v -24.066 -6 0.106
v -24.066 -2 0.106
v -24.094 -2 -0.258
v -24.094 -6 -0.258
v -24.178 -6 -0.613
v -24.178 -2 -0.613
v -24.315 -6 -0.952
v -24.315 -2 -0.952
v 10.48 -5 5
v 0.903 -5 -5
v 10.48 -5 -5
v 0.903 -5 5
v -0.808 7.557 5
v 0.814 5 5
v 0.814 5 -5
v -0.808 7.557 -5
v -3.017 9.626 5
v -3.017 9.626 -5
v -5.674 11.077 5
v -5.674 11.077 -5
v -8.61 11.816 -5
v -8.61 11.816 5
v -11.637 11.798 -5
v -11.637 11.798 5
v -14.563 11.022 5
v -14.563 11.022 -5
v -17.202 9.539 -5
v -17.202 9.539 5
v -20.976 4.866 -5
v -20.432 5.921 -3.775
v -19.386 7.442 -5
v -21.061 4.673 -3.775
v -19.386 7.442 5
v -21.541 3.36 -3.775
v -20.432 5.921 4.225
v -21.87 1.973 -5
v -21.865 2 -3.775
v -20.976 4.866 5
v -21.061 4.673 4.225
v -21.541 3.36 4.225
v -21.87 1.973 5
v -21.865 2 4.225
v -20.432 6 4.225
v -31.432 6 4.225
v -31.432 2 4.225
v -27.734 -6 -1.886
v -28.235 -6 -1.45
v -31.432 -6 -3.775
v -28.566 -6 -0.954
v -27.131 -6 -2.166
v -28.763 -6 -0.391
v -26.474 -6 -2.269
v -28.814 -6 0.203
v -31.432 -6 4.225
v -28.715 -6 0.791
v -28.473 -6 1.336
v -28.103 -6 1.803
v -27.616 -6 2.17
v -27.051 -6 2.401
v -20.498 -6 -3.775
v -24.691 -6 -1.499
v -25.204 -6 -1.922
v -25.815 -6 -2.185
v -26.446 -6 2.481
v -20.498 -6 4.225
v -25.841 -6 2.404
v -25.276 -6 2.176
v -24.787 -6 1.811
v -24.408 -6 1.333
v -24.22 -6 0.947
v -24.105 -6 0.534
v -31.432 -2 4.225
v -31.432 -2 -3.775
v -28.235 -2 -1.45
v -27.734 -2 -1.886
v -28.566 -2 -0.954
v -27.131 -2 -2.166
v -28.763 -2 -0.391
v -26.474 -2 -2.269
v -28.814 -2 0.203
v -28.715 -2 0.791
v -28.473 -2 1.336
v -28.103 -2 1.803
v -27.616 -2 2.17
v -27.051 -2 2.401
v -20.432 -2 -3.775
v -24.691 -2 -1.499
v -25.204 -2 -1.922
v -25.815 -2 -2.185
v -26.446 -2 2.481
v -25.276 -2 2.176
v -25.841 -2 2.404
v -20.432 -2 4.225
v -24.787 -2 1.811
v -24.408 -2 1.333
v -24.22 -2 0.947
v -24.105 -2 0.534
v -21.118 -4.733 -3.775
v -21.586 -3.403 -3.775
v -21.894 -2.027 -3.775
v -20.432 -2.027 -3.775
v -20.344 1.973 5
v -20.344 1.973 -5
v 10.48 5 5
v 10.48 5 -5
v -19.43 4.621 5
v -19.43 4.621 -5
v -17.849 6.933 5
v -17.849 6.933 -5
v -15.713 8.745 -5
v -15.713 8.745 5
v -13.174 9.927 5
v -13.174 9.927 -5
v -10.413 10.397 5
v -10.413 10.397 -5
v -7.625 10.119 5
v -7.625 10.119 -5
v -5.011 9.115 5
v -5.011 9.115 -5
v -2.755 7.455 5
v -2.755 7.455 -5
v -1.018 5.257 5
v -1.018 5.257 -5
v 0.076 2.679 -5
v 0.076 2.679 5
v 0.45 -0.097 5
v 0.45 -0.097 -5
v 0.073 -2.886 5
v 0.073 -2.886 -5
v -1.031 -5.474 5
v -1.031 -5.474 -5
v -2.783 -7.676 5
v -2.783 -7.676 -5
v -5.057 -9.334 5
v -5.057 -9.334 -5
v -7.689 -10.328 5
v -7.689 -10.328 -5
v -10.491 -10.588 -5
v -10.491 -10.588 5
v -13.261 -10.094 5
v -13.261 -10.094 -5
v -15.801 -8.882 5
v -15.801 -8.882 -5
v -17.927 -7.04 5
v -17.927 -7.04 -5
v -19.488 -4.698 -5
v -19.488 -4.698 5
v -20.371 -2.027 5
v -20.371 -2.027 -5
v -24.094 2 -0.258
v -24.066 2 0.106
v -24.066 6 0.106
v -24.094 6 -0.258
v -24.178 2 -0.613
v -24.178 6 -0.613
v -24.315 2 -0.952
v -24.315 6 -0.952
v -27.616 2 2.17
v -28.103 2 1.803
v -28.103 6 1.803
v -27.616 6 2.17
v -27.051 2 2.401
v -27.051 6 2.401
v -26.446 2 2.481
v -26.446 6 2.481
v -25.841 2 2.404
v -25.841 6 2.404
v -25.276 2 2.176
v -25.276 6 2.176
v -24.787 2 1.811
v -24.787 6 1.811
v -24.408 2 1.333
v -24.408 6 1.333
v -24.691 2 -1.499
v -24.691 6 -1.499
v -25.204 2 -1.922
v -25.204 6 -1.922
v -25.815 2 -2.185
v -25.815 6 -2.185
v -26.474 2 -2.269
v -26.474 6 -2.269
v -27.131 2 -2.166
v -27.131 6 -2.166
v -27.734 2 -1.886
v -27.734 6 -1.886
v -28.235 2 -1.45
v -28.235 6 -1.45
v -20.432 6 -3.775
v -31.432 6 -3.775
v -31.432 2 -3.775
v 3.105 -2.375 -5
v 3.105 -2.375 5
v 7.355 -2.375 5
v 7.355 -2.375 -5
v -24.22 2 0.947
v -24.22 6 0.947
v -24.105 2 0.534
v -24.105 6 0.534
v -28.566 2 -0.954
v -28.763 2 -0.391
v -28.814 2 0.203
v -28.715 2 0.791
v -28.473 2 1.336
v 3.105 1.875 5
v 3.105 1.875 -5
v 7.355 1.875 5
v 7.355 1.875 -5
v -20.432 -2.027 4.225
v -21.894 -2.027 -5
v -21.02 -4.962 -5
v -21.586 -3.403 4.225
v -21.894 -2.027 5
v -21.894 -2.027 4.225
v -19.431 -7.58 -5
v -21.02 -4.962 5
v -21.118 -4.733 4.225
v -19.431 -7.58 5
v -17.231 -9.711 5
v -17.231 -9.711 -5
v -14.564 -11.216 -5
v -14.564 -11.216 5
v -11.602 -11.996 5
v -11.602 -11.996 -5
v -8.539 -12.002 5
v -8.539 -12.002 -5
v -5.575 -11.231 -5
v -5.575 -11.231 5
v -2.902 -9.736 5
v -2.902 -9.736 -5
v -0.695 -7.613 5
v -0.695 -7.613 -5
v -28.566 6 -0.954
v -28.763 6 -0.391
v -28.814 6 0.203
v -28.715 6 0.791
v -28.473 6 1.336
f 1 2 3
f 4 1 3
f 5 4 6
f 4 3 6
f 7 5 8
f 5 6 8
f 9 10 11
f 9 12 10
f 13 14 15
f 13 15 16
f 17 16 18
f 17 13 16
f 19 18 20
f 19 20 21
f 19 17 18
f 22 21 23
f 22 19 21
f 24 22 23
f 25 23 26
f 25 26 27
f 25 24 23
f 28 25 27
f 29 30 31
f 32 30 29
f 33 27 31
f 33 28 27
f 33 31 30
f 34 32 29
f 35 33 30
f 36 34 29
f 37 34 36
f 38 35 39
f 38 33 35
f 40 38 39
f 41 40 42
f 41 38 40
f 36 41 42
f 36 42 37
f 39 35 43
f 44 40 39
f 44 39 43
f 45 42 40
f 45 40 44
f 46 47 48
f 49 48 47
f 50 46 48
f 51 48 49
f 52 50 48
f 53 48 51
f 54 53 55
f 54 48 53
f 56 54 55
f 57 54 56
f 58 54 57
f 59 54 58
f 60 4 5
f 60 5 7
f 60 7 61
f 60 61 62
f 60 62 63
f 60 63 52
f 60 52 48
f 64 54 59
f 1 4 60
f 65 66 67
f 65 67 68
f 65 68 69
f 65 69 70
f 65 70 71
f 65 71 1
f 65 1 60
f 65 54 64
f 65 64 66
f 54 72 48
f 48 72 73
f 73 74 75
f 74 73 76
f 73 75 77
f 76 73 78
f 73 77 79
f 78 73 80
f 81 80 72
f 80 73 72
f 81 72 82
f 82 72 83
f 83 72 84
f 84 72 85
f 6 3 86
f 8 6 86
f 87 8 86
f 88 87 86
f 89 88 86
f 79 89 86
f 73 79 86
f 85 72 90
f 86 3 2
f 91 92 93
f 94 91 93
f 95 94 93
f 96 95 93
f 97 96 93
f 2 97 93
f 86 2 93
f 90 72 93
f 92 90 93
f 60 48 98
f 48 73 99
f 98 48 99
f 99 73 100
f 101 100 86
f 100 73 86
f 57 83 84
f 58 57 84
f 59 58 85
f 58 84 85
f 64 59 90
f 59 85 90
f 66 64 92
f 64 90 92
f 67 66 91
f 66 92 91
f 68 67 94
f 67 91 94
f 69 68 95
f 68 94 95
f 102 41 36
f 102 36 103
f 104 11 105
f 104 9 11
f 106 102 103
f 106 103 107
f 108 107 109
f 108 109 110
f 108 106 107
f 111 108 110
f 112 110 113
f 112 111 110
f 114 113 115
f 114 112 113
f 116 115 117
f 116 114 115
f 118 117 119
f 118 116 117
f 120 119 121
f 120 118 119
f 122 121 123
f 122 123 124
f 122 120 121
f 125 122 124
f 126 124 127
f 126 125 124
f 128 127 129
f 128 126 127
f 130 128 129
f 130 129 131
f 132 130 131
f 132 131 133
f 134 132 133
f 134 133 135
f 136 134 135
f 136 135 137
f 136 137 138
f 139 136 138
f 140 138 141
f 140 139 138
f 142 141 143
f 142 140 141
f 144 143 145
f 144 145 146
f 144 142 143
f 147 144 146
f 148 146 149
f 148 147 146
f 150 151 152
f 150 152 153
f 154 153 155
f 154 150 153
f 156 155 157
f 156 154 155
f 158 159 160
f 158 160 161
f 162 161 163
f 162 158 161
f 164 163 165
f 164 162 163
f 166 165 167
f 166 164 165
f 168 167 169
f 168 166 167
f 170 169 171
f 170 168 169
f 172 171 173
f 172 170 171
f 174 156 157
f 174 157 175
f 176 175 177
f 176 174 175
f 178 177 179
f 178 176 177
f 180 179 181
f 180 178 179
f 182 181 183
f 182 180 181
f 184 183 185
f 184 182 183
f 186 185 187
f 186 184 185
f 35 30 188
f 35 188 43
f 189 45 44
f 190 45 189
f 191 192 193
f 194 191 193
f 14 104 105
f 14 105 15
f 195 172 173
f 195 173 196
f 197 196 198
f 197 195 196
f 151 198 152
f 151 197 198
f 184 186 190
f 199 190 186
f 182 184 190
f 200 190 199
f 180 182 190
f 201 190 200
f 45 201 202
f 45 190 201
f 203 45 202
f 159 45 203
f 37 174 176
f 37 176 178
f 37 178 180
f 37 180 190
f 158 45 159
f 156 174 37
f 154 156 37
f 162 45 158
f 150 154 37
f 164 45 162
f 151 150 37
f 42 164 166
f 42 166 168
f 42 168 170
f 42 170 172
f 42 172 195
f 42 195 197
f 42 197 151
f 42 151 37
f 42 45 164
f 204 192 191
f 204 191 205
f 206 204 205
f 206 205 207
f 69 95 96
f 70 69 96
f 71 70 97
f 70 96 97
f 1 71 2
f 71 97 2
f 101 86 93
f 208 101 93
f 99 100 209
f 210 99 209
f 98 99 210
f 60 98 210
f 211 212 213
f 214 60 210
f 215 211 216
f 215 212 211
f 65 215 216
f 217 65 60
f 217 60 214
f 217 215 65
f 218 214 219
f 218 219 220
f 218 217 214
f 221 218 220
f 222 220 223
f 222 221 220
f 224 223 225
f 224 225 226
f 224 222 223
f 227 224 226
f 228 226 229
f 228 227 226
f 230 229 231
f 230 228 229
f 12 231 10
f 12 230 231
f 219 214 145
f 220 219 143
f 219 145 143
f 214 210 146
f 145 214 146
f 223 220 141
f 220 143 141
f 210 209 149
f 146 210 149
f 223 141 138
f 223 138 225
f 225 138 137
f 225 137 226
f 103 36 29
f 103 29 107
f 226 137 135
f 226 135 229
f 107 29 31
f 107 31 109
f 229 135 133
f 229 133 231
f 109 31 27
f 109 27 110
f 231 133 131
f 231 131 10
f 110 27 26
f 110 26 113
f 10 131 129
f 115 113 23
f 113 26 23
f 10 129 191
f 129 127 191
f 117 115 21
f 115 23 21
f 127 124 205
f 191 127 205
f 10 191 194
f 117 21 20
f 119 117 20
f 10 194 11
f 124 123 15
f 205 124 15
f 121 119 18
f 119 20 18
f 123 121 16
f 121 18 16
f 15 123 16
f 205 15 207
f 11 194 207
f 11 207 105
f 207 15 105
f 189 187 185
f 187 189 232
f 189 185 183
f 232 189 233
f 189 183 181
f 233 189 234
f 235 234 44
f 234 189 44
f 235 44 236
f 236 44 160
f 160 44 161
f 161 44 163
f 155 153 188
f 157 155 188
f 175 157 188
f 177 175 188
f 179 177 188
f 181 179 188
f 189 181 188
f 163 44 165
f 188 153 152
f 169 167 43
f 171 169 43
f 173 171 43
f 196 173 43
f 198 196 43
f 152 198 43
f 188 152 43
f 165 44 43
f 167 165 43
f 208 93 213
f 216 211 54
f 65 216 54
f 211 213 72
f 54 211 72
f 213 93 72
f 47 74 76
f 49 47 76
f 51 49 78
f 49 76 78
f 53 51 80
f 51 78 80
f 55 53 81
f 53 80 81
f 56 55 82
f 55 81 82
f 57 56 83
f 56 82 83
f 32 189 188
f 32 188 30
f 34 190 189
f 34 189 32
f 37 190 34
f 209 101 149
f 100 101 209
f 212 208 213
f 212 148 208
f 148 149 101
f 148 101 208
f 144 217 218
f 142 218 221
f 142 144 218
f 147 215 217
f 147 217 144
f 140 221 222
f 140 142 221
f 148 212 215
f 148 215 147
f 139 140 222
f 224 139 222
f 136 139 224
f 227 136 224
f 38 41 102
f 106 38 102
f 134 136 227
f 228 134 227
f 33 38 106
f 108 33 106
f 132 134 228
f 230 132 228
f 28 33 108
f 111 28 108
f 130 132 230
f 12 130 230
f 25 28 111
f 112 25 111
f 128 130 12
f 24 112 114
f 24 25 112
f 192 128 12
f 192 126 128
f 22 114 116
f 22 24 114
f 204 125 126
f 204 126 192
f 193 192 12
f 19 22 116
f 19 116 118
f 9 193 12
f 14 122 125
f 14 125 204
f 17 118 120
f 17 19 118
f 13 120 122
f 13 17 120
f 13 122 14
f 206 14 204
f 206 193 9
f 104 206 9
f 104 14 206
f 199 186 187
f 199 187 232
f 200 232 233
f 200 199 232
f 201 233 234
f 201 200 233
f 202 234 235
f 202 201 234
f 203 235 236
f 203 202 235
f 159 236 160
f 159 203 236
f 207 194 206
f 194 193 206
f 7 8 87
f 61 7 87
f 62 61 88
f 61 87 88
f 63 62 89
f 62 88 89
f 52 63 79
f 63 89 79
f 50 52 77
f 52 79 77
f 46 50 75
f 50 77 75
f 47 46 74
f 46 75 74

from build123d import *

# Parameters (mm, degrees)
F0_W     = 4.25
F0_H     = 4.25
F1_DEPTH = 5
F3_START = 2
F3_DEPTH = 4
F4_START = -2
F4_DEPTH = 4


# Not quite as in the source:
# - a feature names something its author has since deleted; it is built from what else it names


with BuildPart() as f1:
    # F0 (on Top) → F1 (new body, symmetric)
    with BuildSketch(Plane.XY):
        with BuildLine():
            Line((10.48, -5), (10.48, 5))
            Line((10.48, 5), (0.8137170322, 5))
            ThreePointArc((0.8137170322, 5), (1.6624848855, 2.5140482951), (1.95, -0.0970238614))
            ThreePointArc((1.95, -0.0970238614), (1.6852450978, -2.6038191253), (0.9026629175, -5))
            Line((0.9026629175, -5), (10.48, -5))
        make_face()
        with Locations((5.23, -0.25)):
            Rectangle(F0_W, F0_H, mode=Mode.SUBTRACT)
        with BuildLine():
            ThreePointArc((1.95, -0.0970238614), (1.6624848855, 2.5140482951), (0.8137170322, 5))
            Line((0.8137170322, 5), (0.48, 5))
            Line((0.48, 5), (0.48, -5))
            Line((0.48, -5), (0.9026629175, -5))
            ThreePointArc((0.9026629175, -5), (1.6852450978, -2.6038191253), (1.95, -0.0970238614))
        make_face()
        with BuildLine():
            Line((0.48, 5), (0.8137170322, 5))
            ThreePointArc((0.8137170322, 5), (-11.6370433083, 11.7975670747), (-21.8700390085, 1.9734055232))
            Line((-21.8700390085, 1.9734055232), (-20.3438487537, 1.9734055232))
            ThreePointArc((-20.3438487537, 1.9734055232), (-9.0096663788, 10.3513112192), (0.45, -0.0970238614))
            ThreePointArc((0.45, -0.0970238614), (-9.0810805838, -10.5522232935), (-20.3711800314, -2.0265944768))
            Line((-20.3711800314, -2.0265944768), (-21.89384892, -2.0265944768))
            ThreePointArc((-21.89384892, -2.0265944768), (-11.6020432417, -11.9962323131), (0.9026629175, -5))
            Line((0.9026629175, -5), (0.48, -5))
            Line((0.48, -5), (0.48, 5))
        make_face()
    extrude(amount=F1_DEPTH, both=True)

    # F2 (on Front) → F3 (join)
    with BuildSketch(Plane.XZ.offset(F3_START)):
        with BuildLine():
            Line((-28.1025181167, 1.8032137252), (-31.4321152449, 4.2247389093))
            Line((-31.4321152449, 4.2247389093), (-31.4321152449, -3.7752610907))
            Line((-31.4321152449, -3.7752610907), (-28.2350092218, -1.4500930739))
            ThreePointArc((-28.2350092218, -1.4500930739), (-28.8139991516, 0.2028375775), (-28.1025181167, 1.8032137252))
        make_face()
        with BuildLine():
            Line((-24.4076296068, 1.333455737), (-20.4321152449, 4.2247389093))
            Line((-20.4321152449, 4.2247389093), (-31.4321152449, 4.2247389093))
            Line((-31.4321152449, 4.2247389093), (-28.1025181167, 1.8032137252))
            ThreePointArc((-28.1025181167, 1.8032137252), (-26.1414263845, 2.4622306695), (-24.4076296068, 1.333455737))
        make_face()
        with BuildLine():
            Line((-20.4321152449, -3.7752610907), (-20.4321152449, 0.2247389093))
            Line((-20.4321152449, 0.2247389093), (-20.4321152449, 4.2247389093))
            Line((-20.4321152449, 4.2247389093), (-24.4076296068, 1.333455737))
            ThreePointArc((-24.4076296068, 1.333455737), (-24.1529758873, 0.7431613605), (-24.0659662098, 0.1061956755))
            ThreePointArc((-24.0659662098, 0.1061956755), (-24.128951902, -0.4371410894), (-24.3145681805, -0.9516589557))
            Line((-24.3145681805, -0.9516589557), (-20.4321152449, -3.7752610907))
        make_face()
        with BuildLine():
            Line((-31.4321152449, -3.7752610907), (-20.4321152449, -3.7752610907))
            Line((-20.4321152449, -3.7752610907), (-24.3145681805, -0.9516589557))
            ThreePointArc((-24.3145681805, -0.9516589557), (-26.1414263845, -2.2498393185), (-28.2350092218, -1.4500930739))
            Line((-28.2350092218, -1.4500930739), (-31.4321152449, -3.7752610907))
        make_face()
    extrude(amount=F3_DEPTH)

    # F2 (on Front) → F4 (join)
    with BuildSketch(Plane.XZ.offset(F4_START)):
        with BuildLine():
            Line((-28.1025181167, 1.8032137252), (-31.4321152449, 4.2247389093))
            Line((-31.4321152449, 4.2247389093), (-31.4321152449, -3.7752610907))
            Line((-31.4321152449, -3.7752610907), (-28.2350092218, -1.4500930739))
            ThreePointArc((-28.2350092218, -1.4500930739), (-28.8139991516, 0.2028375775), (-28.1025181167, 1.8032137252))
        make_face()
        with BuildLine():
            Line((-24.4076296068, 1.333455737), (-20.4321152449, 4.2247389093))
            Line((-20.4321152449, 4.2247389093), (-31.4321152449, 4.2247389093))
            Line((-31.4321152449, 4.2247389093), (-28.1025181167, 1.8032137252))
            ThreePointArc((-28.1025181167, 1.8032137252), (-26.1414263845, 2.4622306695), (-24.4076296068, 1.333455737))
        make_face()
        with BuildLine():
            Line((-20.4321152449, -3.7752610907), (-20.4321152449, 0.2247389093))
            Line((-20.4321152449, 0.2247389093), (-20.4321152449, 4.2247389093))
            Line((-20.4321152449, 4.2247389093), (-24.4076296068, 1.333455737))
            ThreePointArc((-24.4076296068, 1.333455737), (-24.1529758873, 0.7431613605), (-24.0659662098, 0.1061956755))
            ThreePointArc((-24.0659662098, 0.1061956755), (-24.128951902, -0.4371410894), (-24.3145681805, -0.9516589557))
            Line((-24.3145681805, -0.9516589557), (-20.4321152449, -3.7752610907))
        make_face()
        with BuildLine():
            Line((-31.4321152449, -3.7752610907), (-20.4321152449, -3.7752610907))
            Line((-20.4321152449, -3.7752610907), (-24.3145681805, -0.9516589557))
            ThreePointArc((-24.3145681805, -0.9516589557), (-26.1414263845, -2.2498393185), (-28.2350092218, -1.4500930739))
            Line((-28.2350092218, -1.4500930739), (-31.4321152449, -3.7752610907))
        make_face()
    extrude(amount=-F4_DEPTH)


solid = f1.part
